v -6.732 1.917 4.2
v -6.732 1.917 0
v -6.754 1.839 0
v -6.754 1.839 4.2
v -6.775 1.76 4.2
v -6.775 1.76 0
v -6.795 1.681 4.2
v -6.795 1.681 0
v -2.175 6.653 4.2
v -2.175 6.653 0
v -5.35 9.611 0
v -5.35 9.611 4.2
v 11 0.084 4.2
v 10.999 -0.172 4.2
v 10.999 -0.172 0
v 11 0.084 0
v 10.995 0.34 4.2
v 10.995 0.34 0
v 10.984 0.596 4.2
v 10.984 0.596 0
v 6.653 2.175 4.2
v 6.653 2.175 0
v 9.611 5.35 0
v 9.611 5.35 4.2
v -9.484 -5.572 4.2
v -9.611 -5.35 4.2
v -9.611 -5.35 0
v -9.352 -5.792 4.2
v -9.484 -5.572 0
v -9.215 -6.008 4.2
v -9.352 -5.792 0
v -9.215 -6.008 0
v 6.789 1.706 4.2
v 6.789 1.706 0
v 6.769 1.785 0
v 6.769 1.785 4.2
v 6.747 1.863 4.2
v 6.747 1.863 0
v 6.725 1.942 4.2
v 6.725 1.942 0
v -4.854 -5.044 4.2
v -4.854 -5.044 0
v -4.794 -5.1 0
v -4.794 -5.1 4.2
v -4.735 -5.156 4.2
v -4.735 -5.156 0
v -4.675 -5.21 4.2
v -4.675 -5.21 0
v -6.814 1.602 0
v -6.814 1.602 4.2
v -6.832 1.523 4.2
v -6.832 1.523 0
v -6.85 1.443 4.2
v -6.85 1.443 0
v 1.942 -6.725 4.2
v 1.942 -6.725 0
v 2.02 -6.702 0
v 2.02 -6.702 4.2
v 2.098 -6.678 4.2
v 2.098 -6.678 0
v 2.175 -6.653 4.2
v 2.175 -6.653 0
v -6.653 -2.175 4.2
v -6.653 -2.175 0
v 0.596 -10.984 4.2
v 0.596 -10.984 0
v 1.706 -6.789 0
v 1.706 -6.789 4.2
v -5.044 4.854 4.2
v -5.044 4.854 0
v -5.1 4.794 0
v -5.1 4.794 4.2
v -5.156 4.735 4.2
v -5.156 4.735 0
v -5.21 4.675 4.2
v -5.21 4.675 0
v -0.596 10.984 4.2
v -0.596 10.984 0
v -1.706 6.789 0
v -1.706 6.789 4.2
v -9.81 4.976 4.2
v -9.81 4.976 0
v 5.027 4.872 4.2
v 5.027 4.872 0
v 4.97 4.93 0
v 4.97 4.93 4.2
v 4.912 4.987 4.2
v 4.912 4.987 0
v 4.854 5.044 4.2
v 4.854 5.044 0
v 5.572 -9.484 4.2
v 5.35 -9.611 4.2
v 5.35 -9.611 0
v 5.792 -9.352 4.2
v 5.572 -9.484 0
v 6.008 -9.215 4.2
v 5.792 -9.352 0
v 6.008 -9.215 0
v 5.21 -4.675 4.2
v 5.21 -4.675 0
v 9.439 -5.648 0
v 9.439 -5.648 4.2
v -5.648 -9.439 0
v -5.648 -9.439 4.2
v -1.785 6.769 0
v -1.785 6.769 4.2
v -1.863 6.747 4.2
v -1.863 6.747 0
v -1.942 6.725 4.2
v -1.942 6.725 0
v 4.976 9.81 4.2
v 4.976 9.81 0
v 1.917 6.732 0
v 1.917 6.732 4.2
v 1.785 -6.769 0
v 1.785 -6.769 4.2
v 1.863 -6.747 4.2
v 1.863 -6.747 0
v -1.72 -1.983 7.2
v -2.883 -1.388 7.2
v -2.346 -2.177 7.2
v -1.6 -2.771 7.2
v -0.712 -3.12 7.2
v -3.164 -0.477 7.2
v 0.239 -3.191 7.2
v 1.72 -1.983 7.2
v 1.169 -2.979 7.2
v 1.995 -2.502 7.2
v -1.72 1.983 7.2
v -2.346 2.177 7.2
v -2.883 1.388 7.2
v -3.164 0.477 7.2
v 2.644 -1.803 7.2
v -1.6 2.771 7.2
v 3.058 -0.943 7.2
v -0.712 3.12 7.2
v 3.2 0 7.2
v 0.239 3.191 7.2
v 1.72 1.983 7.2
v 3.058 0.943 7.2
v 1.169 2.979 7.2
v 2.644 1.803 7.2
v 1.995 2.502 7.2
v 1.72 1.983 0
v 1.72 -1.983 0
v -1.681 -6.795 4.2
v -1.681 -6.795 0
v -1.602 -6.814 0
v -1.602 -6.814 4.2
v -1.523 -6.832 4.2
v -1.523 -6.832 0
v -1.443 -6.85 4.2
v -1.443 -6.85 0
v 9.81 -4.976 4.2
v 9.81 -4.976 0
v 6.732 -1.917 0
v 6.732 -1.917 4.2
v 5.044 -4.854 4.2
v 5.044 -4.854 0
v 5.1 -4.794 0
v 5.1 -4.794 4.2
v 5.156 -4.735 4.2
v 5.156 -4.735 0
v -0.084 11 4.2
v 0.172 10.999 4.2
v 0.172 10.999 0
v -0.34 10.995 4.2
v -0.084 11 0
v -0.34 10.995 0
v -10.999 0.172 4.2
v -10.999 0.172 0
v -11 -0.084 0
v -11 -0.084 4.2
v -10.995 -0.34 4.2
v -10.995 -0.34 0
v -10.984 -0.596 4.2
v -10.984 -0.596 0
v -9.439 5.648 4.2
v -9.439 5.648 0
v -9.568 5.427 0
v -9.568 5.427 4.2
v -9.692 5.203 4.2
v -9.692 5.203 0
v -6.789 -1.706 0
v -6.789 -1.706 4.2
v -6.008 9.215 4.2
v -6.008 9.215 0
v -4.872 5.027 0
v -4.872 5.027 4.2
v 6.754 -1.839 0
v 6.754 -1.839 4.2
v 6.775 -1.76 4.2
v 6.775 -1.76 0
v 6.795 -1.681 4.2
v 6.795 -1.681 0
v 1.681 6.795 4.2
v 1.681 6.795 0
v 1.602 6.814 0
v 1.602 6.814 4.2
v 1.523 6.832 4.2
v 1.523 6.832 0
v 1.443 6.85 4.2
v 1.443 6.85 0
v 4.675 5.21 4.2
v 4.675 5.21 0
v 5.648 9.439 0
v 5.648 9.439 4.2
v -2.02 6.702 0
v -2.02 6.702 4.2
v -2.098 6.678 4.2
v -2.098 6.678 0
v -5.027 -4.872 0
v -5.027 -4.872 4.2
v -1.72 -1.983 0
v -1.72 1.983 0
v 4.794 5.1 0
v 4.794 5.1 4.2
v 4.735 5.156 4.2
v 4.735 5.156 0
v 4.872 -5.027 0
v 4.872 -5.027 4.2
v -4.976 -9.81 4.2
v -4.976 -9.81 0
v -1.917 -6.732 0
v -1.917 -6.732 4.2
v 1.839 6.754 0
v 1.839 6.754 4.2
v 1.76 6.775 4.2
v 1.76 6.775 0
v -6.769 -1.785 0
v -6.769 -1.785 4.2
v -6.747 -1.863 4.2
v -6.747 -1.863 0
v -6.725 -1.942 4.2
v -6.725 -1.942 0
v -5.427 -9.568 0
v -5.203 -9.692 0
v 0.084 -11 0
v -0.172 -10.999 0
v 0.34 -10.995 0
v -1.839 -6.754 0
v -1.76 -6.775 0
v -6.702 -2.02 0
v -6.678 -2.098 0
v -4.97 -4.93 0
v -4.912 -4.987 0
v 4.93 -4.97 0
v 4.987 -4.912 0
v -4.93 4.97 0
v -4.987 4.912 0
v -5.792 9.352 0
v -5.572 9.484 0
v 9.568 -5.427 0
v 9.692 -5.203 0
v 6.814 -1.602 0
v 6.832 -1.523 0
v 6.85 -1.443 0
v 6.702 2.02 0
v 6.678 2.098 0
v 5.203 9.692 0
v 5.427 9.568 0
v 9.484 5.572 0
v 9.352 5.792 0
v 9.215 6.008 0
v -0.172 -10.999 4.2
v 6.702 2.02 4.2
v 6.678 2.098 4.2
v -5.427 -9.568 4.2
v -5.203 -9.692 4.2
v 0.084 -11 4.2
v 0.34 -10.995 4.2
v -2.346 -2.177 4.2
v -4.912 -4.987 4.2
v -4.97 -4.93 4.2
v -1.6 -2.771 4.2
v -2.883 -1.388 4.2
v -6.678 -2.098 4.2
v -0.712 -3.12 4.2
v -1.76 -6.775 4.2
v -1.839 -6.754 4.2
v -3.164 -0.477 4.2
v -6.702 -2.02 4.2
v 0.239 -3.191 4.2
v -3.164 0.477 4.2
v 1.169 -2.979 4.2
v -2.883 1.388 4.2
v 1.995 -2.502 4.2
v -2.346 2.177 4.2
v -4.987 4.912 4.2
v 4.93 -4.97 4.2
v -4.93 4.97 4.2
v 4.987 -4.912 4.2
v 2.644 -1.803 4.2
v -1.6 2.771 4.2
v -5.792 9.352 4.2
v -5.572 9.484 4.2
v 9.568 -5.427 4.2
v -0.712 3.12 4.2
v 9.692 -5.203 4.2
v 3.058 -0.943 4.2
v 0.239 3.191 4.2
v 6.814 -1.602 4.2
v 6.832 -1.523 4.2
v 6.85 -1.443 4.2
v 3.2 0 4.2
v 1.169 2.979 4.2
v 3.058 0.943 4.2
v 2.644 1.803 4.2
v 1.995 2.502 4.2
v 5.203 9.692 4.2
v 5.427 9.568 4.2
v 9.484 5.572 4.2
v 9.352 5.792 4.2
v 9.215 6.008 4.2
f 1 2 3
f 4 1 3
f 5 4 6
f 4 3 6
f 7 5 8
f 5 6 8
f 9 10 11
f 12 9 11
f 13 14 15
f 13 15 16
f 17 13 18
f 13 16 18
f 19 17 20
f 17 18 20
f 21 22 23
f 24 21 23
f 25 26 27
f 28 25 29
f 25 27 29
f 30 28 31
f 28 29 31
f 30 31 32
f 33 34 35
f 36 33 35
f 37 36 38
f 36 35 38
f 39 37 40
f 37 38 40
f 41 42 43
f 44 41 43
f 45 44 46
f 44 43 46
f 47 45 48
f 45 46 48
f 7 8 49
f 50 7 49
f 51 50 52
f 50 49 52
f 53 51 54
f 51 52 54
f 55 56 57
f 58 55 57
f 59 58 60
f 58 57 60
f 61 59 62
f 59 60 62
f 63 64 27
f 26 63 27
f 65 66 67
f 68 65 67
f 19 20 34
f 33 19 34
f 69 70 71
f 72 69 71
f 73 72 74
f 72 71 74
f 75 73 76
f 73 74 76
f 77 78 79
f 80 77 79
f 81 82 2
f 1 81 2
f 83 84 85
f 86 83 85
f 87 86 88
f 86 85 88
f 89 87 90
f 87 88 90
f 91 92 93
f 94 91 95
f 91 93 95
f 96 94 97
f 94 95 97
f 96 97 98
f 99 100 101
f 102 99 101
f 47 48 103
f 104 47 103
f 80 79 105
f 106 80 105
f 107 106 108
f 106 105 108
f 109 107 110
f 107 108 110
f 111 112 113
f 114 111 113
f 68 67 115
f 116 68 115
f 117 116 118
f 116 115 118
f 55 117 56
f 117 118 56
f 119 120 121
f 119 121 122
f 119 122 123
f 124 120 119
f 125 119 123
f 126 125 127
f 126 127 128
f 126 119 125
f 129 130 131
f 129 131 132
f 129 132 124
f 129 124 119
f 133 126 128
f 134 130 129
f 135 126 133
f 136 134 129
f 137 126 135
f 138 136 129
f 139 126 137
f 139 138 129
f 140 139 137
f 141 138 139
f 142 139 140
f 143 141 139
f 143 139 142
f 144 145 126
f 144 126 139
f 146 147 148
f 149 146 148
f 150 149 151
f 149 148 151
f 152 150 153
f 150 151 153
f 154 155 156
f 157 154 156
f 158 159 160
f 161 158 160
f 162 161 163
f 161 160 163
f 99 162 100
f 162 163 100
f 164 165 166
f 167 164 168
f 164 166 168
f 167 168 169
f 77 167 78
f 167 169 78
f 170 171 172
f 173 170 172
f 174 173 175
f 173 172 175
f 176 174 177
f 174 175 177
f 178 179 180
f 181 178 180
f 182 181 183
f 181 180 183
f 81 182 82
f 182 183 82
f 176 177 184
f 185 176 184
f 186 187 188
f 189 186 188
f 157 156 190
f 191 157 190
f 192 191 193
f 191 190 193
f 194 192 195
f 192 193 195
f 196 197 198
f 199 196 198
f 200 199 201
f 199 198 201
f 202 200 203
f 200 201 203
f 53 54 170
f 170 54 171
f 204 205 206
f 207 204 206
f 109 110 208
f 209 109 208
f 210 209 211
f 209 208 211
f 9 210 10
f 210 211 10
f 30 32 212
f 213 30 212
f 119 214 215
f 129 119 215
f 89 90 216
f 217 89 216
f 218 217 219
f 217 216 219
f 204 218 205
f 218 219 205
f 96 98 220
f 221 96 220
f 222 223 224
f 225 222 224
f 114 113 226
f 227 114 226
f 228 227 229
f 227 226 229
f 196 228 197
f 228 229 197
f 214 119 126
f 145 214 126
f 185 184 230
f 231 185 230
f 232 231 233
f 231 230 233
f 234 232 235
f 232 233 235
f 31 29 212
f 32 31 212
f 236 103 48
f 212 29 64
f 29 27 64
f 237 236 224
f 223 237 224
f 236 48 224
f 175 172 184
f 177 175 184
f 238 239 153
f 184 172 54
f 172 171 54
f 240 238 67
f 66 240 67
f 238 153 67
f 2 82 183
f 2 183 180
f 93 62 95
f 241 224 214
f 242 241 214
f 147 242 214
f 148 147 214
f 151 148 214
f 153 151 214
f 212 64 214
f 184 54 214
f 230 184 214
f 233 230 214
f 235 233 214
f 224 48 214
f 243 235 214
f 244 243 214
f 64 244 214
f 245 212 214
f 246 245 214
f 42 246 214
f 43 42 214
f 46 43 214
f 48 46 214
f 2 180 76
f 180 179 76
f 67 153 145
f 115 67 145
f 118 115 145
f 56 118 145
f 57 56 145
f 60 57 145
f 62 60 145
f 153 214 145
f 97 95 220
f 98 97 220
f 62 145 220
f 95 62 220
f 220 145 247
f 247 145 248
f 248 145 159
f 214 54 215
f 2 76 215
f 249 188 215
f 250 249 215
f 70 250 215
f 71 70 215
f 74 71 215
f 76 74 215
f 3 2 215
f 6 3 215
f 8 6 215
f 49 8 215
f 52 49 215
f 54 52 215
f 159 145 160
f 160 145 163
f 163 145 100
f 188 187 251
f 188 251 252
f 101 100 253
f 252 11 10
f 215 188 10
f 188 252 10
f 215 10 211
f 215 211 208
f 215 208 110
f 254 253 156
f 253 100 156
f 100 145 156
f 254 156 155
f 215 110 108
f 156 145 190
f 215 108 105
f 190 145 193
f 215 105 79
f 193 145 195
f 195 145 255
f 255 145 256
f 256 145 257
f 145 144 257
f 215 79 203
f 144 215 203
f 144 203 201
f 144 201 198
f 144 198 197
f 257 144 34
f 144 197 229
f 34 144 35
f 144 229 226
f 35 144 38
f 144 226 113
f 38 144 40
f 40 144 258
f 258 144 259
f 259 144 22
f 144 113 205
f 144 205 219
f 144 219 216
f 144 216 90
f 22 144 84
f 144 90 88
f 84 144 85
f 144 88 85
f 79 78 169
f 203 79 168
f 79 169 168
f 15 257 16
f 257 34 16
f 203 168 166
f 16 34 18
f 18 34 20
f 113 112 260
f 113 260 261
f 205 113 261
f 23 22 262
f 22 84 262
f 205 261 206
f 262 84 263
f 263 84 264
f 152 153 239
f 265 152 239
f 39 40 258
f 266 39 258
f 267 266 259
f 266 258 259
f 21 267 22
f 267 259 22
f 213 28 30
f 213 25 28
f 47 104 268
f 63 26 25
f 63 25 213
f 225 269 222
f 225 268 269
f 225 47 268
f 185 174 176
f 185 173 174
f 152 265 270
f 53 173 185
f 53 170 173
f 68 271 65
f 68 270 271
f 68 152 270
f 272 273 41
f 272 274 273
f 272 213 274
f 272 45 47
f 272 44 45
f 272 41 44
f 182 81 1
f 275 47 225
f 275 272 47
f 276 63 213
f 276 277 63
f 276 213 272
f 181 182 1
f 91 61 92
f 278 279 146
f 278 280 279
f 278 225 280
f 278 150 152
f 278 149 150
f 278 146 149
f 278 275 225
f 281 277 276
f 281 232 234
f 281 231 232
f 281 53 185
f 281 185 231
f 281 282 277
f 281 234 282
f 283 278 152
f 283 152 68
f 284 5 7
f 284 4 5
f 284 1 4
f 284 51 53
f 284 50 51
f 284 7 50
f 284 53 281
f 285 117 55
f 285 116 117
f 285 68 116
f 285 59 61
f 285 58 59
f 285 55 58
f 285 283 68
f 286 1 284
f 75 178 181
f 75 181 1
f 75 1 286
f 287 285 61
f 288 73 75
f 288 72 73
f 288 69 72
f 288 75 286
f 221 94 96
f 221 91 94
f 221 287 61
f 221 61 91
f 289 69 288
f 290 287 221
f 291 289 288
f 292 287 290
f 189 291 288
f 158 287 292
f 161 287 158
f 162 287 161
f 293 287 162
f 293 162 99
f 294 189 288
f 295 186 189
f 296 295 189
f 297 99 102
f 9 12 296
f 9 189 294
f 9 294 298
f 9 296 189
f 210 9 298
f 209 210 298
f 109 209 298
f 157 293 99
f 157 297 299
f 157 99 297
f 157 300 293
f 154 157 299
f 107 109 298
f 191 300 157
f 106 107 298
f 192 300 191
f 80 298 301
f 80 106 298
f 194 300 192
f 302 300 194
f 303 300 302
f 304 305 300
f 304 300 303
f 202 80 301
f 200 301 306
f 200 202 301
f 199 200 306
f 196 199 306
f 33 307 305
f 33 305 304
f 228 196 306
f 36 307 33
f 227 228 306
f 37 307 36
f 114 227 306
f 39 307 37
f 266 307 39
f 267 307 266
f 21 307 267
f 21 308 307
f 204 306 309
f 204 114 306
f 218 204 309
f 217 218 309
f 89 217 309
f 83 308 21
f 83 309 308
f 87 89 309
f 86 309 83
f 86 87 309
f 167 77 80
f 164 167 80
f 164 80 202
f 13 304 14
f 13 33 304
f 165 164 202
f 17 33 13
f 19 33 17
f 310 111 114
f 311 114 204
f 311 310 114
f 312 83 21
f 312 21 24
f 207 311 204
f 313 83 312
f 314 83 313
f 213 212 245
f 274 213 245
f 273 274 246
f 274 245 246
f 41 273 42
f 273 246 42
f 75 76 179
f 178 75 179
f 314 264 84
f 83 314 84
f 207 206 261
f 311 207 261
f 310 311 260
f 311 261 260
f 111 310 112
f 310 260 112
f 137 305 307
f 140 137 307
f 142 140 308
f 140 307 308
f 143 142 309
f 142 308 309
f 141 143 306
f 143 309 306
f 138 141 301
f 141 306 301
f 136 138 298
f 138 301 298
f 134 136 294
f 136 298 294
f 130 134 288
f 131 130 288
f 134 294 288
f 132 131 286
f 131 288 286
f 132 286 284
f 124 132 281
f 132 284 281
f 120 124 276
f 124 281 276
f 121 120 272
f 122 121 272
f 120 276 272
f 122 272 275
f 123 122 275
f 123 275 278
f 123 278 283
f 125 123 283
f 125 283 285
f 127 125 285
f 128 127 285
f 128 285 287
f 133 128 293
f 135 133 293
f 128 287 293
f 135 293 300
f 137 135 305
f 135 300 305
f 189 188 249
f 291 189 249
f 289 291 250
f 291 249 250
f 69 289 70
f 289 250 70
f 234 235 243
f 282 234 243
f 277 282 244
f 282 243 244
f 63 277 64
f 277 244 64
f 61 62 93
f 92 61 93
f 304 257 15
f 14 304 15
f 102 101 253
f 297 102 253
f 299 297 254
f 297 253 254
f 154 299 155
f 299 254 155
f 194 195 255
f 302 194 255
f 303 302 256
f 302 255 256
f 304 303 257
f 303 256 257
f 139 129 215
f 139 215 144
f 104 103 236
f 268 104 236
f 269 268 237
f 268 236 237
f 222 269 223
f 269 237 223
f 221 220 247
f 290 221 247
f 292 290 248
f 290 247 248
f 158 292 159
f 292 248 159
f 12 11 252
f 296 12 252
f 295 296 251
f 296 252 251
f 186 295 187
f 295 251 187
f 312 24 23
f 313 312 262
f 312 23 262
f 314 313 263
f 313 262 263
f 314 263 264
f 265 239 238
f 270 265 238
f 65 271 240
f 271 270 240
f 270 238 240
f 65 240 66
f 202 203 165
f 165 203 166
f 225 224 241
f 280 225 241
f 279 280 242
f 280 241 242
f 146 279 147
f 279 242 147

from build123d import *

# Parameters (mm, degrees)
F0_R            = 11
F1_DEPTH        = 4.2
F3_DEPTH        = 4.201
F3_COPIES_COUNT = 12
F5_R            = 3.2
F6_DEPTH        = 3
F7_W            = 3.4390550572
F7_H            = 3.9651677944
F8_DEPTH        = 7.201


# Not quite as in the source:
# - a pattern or mirror of a feature is missing from the dataset's text; its kind, count and spacing are read off the source's solid


with BuildPart() as f1:
    # F0 (on Top) → F1 (new body)
    with BuildSketch(Plane.XY):
        Circle(F0_R)
    extrude(amount=F1_DEPTH)

    # F2 (on face) → F3 (cut, through all)
    with BuildSketch(Plane(origin=(0, 0, 0), x_dir=(1, 0, 0), z_dir=(0, 0, -1))):
        with BuildLine():
            Line((-10.5683914605, 3.0510820928), (-6.7253400203, 1.9415976954))
            ThreePointArc((-6.7253400203, 1.9415976954), (-6.6904301664, 2.0586753481), (-6.6534823425, 2.1751259084))
            Line((-6.6534823425, 2.1751259084), (-9.6111801384, 5.3502538582))
            ThreePointArc((-9.6111801384, 5.3502538582), (-10.1550640166, 4.2278451744), (-10.5683914605, 3.0510820928))
        make_face()
        with BuildLine():
            ThreePointArc((-6.7890039073, 1.7057039447), (-6.7582012706, 1.8239286132), (-6.7253400203, 1.9415976954))
            Line((-6.7253400203, 1.9415976954), (-10.5683914605, 3.0510820928))
            ThreePointArc((-10.5683914605, 3.0510820928), (-10.8458486133, 1.8350934191), (-10.9838684057, 0.5955122546))
            Line((-10.9838684057, 0.5955122546), (-6.7890039073, 1.7057039447))
        make_face()
    f3 = extrude(amount=-F3_DEPTH, mode=Mode.SUBTRACT)

    # F3_copies: F3 ×12 about axis
    f3_copies_axis = Axis((0, 0, 0), (0, 0, 1))
    for i in range(1, F3_COPIES_COUNT):
        add(f3.rotate(f3_copies_axis, i * 360 / F3_COPIES_COUNT), mode=Mode.SUBTRACT)

    # F5 (on face) → F6 (join)
    with BuildSketch(Plane.XY.offset(4.2)):
        Circle(F5_R)
    extrude(amount=F6_DEPTH)

    # F7 (on face) → F8 (cut, through all)
    with BuildSketch(Plane.XY.offset(7.2)):
        Rectangle(F7_W, F7_H)
    extrude(amount=-F8_DEPTH, mode=Mode.SUBTRACT)


solid = f1.part
